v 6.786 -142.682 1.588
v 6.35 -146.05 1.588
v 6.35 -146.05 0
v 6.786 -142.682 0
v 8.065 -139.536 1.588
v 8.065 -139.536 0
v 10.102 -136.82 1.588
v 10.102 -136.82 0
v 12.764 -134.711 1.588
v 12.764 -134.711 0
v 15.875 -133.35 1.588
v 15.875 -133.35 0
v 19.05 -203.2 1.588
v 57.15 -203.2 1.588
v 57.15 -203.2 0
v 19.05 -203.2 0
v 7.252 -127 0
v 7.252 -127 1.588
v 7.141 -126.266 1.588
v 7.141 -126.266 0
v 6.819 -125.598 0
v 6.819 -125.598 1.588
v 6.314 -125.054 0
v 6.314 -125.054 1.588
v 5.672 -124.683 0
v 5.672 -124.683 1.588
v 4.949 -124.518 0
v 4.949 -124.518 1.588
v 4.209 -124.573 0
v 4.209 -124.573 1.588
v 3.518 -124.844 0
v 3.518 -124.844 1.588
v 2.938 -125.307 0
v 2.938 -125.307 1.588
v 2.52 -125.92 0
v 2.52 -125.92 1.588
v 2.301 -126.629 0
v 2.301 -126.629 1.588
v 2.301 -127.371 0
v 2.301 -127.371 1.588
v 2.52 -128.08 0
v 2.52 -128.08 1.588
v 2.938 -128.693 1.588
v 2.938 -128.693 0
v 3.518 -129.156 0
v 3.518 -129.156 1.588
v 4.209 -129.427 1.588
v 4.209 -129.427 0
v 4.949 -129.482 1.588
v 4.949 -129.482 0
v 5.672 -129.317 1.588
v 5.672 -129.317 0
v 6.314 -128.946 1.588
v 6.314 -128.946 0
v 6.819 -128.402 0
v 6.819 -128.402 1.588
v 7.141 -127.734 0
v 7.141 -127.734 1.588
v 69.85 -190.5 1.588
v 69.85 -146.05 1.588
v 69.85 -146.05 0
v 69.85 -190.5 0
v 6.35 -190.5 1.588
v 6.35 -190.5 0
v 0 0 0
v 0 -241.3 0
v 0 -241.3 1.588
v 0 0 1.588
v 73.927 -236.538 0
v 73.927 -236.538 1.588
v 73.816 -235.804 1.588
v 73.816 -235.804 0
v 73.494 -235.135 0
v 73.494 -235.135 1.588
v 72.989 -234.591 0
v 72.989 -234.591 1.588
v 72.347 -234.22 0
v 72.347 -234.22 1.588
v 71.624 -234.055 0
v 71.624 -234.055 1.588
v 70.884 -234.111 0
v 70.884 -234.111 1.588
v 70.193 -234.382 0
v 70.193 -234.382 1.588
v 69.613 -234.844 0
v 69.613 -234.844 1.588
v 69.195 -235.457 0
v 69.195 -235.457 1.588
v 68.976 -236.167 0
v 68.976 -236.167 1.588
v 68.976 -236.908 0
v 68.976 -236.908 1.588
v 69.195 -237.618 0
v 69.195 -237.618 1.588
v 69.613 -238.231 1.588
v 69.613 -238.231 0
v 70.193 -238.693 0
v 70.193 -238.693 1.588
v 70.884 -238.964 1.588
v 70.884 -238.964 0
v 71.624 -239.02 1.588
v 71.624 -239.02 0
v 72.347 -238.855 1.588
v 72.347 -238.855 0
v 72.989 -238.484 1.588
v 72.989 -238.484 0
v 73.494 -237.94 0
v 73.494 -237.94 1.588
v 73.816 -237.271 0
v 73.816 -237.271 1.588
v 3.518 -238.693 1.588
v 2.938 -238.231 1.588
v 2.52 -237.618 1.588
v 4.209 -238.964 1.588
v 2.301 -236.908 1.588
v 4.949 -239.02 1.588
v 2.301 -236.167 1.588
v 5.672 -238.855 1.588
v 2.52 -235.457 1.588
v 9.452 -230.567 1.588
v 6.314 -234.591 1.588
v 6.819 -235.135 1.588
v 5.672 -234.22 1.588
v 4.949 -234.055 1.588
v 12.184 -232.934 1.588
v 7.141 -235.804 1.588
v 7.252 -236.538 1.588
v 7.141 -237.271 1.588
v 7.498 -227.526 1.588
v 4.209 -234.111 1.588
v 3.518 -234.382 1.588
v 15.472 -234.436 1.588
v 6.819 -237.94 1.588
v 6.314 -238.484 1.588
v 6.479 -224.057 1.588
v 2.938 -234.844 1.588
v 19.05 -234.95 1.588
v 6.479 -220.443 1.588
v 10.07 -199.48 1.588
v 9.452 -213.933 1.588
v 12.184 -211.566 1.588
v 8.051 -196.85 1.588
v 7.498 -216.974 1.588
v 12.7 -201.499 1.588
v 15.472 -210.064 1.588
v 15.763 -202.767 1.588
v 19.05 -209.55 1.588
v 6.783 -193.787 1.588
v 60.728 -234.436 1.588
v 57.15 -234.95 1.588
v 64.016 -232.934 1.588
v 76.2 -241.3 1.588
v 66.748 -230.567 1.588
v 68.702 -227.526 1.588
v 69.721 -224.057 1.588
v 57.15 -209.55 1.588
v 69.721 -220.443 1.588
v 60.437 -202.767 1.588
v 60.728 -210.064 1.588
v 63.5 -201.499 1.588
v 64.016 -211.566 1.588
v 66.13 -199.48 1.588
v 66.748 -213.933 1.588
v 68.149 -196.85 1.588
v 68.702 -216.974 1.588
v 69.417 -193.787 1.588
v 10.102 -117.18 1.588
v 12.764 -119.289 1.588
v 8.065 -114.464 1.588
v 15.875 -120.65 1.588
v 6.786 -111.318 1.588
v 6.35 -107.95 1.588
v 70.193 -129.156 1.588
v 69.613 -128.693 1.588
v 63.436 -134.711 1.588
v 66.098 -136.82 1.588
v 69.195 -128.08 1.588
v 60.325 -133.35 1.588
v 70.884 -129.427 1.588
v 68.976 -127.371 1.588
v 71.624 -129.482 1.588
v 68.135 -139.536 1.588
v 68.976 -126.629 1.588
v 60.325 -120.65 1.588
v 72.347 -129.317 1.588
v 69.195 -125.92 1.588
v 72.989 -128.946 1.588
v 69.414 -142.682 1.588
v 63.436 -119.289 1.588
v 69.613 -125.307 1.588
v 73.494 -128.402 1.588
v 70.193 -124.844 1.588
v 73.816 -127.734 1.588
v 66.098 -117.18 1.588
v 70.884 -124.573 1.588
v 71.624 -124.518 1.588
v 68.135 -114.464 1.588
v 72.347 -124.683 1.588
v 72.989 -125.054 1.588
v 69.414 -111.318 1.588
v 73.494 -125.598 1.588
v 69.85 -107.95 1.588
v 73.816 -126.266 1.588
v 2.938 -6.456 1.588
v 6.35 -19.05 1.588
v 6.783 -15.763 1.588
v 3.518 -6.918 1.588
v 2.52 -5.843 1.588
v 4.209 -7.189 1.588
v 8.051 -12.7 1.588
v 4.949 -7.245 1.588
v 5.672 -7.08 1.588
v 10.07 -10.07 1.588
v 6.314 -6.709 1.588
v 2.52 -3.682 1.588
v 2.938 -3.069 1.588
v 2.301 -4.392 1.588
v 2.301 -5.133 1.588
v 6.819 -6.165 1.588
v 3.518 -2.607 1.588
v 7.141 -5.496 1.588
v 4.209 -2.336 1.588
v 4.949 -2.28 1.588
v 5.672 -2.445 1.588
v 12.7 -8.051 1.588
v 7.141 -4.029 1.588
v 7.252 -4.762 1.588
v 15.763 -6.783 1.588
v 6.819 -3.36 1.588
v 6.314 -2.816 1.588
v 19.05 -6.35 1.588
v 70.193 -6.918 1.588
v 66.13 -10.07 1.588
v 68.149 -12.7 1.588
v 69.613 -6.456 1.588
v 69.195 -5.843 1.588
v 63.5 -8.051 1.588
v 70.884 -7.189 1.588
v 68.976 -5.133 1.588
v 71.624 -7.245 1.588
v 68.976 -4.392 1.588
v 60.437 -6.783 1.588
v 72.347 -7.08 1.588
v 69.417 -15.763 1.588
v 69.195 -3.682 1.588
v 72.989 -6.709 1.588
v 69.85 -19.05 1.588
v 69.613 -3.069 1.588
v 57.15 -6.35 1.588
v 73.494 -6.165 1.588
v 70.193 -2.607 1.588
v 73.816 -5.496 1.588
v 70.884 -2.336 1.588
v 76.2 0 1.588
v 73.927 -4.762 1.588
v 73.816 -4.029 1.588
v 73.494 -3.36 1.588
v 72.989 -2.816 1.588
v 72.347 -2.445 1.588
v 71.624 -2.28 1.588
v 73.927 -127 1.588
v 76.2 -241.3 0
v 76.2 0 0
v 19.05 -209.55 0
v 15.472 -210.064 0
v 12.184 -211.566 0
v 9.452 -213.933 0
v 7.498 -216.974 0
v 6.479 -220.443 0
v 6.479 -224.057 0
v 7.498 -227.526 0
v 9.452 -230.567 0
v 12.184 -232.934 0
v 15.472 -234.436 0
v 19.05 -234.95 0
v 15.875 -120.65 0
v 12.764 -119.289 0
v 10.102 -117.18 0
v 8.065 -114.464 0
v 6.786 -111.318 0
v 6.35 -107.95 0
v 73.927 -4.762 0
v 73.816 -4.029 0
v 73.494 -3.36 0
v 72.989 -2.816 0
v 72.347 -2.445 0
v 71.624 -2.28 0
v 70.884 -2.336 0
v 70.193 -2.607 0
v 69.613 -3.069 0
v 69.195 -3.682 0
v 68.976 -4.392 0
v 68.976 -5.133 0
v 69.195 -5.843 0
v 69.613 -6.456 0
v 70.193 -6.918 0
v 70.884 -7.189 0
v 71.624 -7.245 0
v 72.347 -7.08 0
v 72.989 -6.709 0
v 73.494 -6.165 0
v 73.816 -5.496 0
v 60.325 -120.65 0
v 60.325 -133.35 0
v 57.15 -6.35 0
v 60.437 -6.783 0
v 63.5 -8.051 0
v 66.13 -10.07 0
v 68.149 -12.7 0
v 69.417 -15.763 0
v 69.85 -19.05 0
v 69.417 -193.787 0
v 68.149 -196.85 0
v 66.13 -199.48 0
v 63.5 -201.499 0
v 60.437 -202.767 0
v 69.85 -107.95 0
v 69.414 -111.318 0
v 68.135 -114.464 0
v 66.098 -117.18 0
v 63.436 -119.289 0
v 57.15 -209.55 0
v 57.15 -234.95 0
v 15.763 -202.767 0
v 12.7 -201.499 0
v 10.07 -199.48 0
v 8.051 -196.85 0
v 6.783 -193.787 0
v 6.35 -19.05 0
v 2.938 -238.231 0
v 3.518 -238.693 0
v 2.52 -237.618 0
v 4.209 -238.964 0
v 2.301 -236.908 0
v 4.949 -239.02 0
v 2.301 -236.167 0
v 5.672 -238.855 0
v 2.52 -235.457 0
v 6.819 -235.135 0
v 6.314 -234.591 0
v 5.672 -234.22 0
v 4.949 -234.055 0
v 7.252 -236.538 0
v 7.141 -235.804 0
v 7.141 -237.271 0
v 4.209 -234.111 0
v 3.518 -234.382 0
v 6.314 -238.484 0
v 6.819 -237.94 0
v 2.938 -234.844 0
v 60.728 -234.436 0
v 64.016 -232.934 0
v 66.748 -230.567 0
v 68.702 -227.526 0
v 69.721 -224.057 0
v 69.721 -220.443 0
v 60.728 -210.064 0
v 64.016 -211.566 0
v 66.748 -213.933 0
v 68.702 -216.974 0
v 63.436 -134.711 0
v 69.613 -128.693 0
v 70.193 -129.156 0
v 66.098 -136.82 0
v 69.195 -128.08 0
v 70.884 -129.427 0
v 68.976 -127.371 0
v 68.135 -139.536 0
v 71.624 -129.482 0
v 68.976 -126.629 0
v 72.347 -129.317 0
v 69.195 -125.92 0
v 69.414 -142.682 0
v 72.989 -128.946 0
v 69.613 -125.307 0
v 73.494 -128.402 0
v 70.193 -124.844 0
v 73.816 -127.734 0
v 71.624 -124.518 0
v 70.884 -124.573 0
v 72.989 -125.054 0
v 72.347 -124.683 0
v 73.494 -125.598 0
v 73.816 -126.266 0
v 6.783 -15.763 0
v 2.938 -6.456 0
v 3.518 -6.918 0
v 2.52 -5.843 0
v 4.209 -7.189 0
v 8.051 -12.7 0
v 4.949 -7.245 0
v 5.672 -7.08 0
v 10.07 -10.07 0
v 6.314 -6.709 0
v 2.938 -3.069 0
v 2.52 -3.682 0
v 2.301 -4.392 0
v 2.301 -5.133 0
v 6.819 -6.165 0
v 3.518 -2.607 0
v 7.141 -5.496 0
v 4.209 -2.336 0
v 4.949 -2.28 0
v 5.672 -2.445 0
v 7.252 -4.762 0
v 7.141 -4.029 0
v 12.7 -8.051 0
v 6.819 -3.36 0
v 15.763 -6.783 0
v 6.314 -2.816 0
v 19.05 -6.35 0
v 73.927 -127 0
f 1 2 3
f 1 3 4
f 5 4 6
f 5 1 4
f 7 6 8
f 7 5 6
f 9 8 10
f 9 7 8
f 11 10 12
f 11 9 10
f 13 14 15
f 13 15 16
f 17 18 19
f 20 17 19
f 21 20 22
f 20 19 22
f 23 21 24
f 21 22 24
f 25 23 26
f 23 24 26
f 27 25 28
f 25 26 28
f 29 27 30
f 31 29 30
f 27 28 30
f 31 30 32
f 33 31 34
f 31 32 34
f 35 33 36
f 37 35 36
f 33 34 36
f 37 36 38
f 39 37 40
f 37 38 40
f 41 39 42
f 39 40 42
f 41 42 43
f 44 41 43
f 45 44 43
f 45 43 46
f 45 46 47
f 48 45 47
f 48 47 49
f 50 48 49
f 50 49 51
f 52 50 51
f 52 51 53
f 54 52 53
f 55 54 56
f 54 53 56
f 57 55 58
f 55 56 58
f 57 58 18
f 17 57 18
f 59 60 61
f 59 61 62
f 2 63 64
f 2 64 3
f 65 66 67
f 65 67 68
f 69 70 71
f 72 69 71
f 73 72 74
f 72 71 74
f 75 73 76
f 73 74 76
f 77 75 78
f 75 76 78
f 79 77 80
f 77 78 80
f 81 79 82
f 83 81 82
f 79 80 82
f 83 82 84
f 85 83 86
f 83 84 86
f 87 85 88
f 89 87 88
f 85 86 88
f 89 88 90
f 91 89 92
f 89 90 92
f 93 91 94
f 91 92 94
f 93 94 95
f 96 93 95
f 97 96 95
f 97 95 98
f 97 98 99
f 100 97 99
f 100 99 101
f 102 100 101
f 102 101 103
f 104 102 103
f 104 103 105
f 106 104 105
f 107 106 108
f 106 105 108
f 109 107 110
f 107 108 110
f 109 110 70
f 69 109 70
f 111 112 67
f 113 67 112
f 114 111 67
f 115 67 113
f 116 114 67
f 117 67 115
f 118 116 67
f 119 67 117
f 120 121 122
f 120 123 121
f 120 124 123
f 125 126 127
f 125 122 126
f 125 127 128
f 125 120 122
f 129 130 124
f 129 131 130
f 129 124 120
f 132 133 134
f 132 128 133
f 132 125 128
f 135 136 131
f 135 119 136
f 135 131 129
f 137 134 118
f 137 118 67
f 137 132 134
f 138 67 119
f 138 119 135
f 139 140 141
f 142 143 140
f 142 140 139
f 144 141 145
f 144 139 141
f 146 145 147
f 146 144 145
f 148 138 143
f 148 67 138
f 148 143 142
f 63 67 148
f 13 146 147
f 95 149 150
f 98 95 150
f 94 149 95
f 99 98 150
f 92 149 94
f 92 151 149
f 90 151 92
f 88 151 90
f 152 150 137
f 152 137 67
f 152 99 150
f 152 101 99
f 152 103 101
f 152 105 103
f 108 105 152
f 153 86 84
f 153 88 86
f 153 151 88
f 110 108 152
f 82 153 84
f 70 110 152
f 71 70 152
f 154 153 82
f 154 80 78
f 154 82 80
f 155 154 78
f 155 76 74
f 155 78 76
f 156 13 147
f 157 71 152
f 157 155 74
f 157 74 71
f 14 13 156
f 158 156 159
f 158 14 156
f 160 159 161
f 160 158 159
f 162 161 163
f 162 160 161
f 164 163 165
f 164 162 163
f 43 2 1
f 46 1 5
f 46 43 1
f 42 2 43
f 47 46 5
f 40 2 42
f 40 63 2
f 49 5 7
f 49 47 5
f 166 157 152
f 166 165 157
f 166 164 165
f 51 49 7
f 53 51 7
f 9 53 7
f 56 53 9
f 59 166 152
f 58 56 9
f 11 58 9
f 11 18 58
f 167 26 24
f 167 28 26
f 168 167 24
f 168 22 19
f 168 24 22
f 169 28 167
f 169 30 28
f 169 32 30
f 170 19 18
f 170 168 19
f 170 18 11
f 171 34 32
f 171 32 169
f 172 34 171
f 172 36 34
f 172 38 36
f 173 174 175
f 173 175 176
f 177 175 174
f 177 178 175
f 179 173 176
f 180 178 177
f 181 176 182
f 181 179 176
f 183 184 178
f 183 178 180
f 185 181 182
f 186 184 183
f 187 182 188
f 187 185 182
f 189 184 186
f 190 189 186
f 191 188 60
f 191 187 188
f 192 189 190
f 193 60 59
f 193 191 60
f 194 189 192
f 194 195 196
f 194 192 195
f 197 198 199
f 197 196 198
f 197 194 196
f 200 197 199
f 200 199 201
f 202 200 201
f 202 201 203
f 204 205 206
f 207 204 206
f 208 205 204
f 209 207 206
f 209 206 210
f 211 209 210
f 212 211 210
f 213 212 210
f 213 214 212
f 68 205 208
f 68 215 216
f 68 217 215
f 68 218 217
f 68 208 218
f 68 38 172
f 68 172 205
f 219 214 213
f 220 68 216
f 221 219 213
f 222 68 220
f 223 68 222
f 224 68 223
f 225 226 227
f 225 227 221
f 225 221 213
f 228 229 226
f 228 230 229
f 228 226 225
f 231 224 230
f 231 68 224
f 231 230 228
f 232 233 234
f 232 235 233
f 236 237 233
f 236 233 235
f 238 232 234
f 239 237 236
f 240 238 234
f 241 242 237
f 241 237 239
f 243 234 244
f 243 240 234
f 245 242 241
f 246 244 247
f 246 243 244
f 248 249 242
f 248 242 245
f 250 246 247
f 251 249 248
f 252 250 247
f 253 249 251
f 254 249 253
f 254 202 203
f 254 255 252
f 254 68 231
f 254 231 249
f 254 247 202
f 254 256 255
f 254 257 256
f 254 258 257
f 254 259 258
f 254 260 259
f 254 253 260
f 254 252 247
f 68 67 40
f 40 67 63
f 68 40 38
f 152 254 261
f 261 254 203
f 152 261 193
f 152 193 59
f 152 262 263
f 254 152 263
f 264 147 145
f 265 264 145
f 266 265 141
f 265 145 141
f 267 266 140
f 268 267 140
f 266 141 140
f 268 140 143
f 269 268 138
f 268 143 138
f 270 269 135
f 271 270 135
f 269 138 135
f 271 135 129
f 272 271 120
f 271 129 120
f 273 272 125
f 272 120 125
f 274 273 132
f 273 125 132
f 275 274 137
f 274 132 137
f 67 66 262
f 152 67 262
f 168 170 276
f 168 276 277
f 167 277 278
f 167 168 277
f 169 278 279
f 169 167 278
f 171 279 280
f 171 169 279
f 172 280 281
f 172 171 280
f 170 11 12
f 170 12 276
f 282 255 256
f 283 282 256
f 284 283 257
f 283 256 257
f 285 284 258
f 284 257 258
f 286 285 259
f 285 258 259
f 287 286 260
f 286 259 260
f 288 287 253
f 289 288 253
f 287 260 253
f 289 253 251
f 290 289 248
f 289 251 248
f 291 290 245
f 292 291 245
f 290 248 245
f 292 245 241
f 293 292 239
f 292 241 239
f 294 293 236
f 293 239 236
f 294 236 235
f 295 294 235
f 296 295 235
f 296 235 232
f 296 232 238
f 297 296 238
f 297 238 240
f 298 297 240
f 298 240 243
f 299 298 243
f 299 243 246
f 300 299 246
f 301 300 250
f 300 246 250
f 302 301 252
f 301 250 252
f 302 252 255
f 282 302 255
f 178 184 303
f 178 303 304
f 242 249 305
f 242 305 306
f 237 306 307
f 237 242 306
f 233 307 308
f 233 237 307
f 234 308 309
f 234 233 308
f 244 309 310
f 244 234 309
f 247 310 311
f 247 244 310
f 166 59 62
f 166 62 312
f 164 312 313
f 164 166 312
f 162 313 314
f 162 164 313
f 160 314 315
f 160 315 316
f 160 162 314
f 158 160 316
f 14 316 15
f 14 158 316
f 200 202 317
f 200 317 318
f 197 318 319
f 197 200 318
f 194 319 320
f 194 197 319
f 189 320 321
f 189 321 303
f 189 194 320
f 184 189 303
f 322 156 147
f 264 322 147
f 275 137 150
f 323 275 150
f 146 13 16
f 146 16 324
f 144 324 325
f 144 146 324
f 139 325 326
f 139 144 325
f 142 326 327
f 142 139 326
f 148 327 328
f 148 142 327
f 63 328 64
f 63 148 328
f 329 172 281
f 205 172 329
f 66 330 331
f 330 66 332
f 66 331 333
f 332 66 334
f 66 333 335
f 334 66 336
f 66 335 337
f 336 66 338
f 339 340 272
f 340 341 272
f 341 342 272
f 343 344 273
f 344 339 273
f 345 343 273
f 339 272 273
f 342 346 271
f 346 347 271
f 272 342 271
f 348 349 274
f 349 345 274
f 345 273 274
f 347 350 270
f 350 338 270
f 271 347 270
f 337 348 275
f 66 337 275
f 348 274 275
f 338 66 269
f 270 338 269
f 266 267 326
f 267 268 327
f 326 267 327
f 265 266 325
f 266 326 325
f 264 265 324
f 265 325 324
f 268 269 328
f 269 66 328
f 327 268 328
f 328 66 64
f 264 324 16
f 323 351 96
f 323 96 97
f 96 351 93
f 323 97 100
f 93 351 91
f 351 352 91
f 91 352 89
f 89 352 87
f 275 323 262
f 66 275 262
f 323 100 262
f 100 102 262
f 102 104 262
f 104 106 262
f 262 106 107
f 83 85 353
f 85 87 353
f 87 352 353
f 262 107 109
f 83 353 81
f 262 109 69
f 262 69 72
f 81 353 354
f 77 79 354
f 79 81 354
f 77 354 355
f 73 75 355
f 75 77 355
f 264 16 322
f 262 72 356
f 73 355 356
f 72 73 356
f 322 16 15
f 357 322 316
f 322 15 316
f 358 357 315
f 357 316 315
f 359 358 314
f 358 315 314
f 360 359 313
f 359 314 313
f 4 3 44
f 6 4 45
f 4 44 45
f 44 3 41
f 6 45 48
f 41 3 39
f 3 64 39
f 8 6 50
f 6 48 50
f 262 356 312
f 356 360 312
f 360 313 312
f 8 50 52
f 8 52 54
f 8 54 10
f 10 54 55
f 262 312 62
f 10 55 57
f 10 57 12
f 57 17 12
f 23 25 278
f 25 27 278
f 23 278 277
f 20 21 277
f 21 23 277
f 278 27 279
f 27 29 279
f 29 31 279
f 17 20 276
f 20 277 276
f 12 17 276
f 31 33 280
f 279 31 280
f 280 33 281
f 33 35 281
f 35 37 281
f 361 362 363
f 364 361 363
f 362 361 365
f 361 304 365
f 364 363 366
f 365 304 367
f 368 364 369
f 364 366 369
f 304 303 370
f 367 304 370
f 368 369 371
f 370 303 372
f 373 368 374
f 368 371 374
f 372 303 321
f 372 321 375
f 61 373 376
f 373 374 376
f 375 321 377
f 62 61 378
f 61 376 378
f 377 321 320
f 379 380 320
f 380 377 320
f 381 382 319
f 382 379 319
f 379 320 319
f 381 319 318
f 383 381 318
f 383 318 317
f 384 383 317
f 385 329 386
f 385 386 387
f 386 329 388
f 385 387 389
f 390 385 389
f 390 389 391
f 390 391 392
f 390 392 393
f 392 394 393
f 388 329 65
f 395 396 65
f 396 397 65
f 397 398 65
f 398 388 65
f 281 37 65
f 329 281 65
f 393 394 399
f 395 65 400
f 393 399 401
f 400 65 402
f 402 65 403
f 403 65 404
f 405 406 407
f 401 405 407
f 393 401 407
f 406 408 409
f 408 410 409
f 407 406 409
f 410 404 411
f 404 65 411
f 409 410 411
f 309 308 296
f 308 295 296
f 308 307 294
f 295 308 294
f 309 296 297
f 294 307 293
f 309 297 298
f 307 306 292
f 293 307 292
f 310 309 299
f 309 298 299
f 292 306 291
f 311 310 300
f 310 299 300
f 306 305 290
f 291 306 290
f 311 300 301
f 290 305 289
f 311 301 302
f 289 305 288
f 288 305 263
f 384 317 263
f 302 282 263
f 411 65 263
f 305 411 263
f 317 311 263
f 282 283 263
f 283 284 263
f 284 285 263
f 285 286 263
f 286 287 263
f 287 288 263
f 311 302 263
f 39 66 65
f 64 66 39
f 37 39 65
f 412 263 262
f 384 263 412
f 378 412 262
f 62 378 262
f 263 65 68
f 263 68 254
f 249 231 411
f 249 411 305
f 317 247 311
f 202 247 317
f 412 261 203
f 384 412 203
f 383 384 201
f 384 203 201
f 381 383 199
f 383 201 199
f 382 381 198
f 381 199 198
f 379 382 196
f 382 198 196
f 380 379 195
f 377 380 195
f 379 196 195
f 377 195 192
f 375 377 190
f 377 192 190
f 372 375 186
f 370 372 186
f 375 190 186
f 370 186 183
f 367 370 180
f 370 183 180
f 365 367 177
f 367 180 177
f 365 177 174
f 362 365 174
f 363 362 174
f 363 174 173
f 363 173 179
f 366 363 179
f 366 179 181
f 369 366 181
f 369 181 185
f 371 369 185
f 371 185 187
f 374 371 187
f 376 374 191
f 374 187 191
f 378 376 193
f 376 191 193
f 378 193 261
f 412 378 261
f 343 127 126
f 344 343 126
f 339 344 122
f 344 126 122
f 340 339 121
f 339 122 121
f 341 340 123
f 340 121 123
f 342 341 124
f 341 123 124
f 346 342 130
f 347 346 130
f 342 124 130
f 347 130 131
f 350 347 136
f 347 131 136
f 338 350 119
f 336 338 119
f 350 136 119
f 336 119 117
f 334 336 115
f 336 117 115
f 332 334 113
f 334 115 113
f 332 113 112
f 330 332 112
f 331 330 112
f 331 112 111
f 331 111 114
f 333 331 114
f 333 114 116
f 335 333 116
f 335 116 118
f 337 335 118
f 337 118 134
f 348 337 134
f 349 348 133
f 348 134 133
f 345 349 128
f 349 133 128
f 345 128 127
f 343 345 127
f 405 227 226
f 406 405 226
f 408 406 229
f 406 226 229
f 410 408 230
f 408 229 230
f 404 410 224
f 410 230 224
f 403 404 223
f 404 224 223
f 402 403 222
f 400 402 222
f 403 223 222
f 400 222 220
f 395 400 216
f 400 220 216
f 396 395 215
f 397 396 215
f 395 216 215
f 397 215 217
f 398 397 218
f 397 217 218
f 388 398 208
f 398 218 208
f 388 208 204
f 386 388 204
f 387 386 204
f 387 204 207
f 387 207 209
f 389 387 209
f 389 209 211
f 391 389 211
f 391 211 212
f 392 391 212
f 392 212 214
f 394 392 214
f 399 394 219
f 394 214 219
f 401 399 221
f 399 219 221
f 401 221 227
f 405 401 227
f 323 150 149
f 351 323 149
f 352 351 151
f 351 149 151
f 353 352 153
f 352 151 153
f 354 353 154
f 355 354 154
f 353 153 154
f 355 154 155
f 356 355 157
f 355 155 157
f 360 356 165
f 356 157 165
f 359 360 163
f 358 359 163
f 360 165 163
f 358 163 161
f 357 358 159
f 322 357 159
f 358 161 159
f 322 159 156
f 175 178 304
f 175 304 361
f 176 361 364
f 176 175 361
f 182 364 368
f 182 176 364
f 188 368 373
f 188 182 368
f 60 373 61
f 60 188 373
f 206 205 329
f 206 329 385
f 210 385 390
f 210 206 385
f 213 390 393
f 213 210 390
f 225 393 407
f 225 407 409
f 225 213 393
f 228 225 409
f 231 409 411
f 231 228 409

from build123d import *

# Parameters (mm, degrees)
SKETCH1_W           = 76.2
SKETCH1_H           = 241.3
BOSS_EXTRUDE1_DEPTH = 1.5875
CUT_EXTRUDE1_DEPTH  = 1.5875
SKETCH3_R           = 2.4892
CUT_EXTRUDE2_DEPTH  = 1.5875


with BuildPart() as part:
    # Sketch1 → Boss-Extrude1 (new body)
    with BuildSketch(Plane.XY):
        with Locations((38.1, -120.65)):
            Rectangle(SKETCH1_W, SKETCH1_H)
    extrude(amount=BOSS_EXTRUDE1_DEPTH)

    # Sketch2 → Cut-Extrude1 (cut)
    with BuildSketch(Plane.XY.offset(1.5875)):
        with BuildLine():
            Line((19.05, -6.35), (57.15, -6.35))
            ThreePointArc((57.15, -6.35), (66.130256121, -10.069743879), (69.85, -19.05))
            Line((69.85, -19.05), (69.85, -107.95))
            ThreePointArc((69.85, -107.95), (67.204166667, -115.8875), (60.325, -120.65))
            Line((60.325, -120.65), (60.325, -133.35))
            ThreePointArc((60.325, -133.35), (67.204166667, -138.1125), (69.85, -146.05))
            Line((69.85, -146.05), (69.85, -190.5))
            ThreePointArc((69.85, -190.5), (66.130256121, -199.480256121), (57.15, -203.2))
            Line((57.15, -203.2), (19.05, -203.2))
            ThreePointArc((19.05, -203.2), (10.069743879, -199.480256121), (6.35, -190.5))
            Line((6.35, -190.5), (6.35, -146.05))
            ThreePointArc((6.35, -146.05), (8.995833333, -138.1125), (15.875, -133.35))
            Line((15.875, -133.35), (15.875, -120.65))
            ThreePointArc((15.875, -120.65), (8.995833333, -115.8875), (6.35, -107.95))
            Line((6.35, -107.95), (6.35, -19.05))
            ThreePointArc((6.35, -19.05), (10.069743879, -10.069743879), (19.05, -6.35))
        make_face()
        with BuildLine():
            Line((19.05, -234.95), (57.15, -234.95))
            ThreePointArc((57.15, -234.95), (69.85, -222.25), (57.15, -209.55))
            Line((57.15, -209.55), (19.05, -209.55))
            ThreePointArc((19.05, -209.55), (6.35, -222.25), (19.05, -234.95))
        make_face()
    extrude(amount=-CUT_EXTRUDE1_DEPTH, mode=Mode.SUBTRACT)

    # Sketch3 → Cut-Extrude2 (cut)
    with BuildSketch(Plane.XY.offset(1.5875)):
        with Locations((4.7625, -4.7625)):
            Circle(SKETCH3_R)
        with Locations((71.4375, -4.7625)):
            Circle(SKETCH3_R)
        with Locations((71.4375, -127)):
            Circle(SKETCH3_R)
        with Locations((4.7625, -127)):
            Circle(SKETCH3_R)
        with Locations((4.7625, -236.5375)):
            Circle(SKETCH3_R)
        with Locations((71.4375, -236.5375)):
            Circle(SKETCH3_R)
    extrude(amount=-CUT_EXTRUDE2_DEPTH, mode=Mode.SUBTRACT)


solid = part.part
